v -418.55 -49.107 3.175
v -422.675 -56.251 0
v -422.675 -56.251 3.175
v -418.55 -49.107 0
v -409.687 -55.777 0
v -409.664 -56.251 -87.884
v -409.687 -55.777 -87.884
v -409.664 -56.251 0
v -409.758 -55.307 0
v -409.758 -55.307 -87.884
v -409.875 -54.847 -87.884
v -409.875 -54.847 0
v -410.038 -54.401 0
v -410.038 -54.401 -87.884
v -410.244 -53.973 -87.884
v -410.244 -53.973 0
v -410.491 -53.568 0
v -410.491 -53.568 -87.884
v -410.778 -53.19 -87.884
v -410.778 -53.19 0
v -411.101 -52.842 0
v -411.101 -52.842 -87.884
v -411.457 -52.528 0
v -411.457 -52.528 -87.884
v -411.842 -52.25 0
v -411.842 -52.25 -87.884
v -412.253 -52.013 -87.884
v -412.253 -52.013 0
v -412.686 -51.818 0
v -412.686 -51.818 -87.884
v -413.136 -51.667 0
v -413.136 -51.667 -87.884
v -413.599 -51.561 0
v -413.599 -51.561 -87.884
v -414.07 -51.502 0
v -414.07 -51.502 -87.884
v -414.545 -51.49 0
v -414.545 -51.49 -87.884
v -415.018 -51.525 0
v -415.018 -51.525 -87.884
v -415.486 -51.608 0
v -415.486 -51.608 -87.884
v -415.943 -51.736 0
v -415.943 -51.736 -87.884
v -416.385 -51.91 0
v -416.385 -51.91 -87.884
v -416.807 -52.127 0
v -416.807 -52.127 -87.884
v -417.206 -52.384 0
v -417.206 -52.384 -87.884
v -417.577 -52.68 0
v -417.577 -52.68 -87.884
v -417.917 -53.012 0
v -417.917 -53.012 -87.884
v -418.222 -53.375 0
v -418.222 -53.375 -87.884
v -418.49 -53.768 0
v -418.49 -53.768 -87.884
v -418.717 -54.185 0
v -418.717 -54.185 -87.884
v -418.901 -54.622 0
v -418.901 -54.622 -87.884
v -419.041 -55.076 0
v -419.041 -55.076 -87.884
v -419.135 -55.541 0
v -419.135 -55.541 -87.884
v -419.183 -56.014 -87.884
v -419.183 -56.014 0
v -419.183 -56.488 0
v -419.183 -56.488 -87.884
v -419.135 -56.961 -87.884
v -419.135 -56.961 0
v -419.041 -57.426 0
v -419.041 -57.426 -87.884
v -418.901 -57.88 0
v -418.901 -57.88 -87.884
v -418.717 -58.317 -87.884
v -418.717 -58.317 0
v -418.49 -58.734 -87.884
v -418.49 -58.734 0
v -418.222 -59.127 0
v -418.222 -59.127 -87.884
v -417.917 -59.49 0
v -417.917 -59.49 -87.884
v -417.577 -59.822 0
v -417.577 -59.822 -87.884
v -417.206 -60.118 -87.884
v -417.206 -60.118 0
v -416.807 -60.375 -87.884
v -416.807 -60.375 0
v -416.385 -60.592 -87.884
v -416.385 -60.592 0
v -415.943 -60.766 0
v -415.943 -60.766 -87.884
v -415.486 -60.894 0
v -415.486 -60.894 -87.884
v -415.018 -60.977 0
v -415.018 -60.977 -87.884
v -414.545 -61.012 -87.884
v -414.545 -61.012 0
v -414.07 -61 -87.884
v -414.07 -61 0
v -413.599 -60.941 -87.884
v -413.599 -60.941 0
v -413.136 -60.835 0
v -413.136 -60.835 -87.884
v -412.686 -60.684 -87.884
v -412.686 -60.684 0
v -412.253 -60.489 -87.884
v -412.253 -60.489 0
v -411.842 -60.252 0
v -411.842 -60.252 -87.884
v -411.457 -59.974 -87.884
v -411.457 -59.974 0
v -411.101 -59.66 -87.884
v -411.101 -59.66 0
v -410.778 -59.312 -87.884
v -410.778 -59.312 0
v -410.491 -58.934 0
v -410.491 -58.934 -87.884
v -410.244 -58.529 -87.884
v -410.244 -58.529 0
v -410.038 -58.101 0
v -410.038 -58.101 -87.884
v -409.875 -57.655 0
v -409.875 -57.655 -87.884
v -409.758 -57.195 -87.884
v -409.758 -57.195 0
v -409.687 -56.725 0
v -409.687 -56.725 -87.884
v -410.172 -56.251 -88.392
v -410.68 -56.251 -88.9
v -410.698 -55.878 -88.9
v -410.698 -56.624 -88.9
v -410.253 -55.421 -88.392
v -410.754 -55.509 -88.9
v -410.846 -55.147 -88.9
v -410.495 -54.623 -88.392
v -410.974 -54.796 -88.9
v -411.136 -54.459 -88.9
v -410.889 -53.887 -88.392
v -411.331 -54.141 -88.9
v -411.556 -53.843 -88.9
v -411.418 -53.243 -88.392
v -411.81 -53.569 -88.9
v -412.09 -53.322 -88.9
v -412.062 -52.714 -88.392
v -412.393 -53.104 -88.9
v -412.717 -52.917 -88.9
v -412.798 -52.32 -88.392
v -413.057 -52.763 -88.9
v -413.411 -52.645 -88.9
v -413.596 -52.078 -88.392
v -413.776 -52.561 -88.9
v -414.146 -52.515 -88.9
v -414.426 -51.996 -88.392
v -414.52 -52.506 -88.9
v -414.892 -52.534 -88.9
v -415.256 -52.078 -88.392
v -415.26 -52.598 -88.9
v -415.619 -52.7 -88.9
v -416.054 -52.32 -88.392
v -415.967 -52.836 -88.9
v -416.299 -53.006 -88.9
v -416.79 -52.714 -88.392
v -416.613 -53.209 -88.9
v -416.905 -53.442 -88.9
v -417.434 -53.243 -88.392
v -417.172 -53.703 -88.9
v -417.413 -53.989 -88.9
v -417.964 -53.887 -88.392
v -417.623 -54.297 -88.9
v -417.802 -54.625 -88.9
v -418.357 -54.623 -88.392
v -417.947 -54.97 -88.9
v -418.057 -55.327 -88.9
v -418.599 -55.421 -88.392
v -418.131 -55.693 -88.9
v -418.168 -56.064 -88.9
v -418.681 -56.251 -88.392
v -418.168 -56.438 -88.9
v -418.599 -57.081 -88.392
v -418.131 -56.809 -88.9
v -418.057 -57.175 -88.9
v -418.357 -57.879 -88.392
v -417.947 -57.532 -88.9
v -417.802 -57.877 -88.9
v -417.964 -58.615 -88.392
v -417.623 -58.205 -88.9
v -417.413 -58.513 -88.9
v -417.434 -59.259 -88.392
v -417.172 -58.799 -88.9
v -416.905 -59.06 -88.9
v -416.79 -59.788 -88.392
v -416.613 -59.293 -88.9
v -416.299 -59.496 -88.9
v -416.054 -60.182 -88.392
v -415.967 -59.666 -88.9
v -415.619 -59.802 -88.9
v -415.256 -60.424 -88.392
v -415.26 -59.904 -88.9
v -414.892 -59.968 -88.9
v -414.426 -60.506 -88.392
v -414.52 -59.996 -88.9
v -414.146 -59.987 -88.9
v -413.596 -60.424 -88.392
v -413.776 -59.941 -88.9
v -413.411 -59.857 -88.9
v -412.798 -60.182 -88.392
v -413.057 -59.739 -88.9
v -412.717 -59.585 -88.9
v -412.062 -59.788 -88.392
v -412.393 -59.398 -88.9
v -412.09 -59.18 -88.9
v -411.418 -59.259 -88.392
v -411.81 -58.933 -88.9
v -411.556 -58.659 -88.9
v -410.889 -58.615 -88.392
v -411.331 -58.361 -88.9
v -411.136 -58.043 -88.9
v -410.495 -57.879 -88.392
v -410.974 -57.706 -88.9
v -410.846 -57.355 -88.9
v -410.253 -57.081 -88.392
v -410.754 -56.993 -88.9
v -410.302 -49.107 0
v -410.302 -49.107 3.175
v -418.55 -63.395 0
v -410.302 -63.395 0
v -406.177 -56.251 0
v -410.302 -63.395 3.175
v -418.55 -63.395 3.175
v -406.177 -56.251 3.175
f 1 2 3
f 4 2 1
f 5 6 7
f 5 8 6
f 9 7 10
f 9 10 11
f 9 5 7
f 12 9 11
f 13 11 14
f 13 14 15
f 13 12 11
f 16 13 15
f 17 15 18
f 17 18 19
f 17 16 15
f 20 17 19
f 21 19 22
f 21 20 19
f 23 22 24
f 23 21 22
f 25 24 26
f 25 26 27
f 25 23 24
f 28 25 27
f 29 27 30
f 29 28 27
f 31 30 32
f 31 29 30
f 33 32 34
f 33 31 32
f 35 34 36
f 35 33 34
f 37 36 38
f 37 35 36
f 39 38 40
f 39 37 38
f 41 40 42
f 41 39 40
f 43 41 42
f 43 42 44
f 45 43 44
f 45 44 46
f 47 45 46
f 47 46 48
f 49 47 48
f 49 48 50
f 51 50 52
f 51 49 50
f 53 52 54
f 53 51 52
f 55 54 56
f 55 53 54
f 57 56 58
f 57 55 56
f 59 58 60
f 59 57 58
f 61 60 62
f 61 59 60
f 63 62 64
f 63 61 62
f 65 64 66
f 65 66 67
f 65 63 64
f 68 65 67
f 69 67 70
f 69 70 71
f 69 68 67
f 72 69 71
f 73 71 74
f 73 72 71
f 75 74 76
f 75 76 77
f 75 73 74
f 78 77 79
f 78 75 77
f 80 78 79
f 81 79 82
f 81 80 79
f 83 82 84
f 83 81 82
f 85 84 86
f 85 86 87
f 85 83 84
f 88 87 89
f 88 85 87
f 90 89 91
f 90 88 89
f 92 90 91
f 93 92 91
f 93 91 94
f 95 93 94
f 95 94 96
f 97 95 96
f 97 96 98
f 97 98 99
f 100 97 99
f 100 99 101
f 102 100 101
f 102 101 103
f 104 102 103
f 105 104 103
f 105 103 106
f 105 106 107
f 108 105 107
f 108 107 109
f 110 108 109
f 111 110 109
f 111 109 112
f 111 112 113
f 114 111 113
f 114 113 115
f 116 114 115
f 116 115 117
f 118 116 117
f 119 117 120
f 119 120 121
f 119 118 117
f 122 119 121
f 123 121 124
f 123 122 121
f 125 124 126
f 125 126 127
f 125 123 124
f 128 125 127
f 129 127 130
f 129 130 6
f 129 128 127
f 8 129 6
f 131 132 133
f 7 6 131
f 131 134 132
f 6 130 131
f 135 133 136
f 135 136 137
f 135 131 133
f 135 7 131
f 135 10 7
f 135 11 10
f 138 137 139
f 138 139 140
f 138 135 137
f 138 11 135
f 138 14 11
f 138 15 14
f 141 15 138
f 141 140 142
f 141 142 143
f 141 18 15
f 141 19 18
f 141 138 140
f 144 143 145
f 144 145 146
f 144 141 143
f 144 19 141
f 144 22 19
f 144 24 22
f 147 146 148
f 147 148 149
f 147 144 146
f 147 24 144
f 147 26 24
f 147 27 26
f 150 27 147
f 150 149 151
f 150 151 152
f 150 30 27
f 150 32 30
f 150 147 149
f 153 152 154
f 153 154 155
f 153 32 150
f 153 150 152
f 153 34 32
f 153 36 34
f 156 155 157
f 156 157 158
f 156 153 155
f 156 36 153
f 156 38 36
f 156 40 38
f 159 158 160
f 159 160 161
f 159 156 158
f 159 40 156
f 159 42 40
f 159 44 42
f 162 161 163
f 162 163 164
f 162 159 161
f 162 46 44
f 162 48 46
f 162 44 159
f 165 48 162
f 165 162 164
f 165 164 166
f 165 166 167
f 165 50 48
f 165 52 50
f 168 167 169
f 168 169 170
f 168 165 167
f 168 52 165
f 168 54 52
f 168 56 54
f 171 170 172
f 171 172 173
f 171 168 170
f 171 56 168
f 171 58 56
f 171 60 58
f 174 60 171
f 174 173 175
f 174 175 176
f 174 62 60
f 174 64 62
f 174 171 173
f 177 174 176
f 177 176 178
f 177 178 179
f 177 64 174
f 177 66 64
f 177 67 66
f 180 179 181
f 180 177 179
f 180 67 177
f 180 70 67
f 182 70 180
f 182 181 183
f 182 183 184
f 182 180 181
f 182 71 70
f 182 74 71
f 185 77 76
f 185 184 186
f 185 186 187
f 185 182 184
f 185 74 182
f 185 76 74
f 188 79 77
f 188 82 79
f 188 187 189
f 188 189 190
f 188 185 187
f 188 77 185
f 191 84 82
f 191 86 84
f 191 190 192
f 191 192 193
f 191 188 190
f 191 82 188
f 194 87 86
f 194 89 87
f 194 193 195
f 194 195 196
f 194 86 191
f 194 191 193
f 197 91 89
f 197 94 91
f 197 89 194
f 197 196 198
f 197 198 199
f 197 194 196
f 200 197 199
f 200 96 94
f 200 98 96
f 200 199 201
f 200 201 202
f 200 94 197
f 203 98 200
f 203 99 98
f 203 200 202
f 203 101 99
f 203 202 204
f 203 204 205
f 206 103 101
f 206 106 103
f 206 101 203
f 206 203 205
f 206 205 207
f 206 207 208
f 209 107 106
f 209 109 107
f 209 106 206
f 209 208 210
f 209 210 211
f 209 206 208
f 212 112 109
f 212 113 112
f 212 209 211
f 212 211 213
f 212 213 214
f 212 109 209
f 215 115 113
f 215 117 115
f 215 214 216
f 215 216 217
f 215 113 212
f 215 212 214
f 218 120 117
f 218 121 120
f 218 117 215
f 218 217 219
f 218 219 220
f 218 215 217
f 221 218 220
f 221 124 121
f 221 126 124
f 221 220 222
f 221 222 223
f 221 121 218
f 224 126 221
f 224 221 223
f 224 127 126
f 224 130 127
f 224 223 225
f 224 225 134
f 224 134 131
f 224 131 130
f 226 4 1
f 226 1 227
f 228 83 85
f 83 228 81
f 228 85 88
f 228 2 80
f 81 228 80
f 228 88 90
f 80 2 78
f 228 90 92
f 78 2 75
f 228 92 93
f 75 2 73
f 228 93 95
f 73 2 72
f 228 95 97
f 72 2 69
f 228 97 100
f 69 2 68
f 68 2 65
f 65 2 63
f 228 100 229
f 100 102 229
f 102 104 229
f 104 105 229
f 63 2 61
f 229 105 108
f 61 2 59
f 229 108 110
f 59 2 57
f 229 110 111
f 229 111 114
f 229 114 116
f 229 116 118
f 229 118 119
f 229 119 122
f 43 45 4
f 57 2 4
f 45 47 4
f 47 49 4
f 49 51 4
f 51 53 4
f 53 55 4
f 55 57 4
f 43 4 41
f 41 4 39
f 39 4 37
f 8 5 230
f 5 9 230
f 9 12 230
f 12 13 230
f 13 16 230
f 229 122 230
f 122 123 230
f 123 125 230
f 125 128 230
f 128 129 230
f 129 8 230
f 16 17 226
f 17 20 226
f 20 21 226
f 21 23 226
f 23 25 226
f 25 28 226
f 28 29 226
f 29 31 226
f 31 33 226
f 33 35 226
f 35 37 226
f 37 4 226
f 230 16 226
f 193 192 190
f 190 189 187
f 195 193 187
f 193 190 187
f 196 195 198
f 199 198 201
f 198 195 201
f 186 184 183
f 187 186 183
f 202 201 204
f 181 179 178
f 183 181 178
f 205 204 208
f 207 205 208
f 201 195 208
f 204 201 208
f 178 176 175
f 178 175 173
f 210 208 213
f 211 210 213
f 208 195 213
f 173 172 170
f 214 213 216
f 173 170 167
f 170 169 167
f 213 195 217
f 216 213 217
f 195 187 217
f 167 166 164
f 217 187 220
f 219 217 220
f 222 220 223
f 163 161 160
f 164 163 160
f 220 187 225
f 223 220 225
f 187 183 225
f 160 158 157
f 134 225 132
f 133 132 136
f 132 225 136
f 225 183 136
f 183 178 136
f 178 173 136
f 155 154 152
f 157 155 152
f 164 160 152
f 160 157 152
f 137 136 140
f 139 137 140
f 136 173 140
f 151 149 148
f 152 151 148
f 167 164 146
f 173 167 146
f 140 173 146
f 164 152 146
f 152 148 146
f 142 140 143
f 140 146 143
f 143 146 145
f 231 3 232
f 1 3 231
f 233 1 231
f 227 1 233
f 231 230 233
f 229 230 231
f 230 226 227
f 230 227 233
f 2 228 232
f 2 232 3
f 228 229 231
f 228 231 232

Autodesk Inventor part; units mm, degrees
ref_plane "YZ Plane" through (0, 0, 0) normal (1, 0, 0) x (0, 1, 0)
ref_plane "XZ Plane" through (0, 0, 0) normal (0, 1, 0) x (-1, 0, 0)
ref_plane "XY Plane" through (0, 0, 0) normal (0, 0, 1) x (1, 0, 0)
sketch "Sketch1" plane through (0, 0, 0) normal (0, 0, 1) x (1, 0, 0)
  circle A0 centre (-414.4261, -56.251) radius 4.7625
  point P0 (0, 0)
  dimension "d0" = 9.525
extrude "Extrusion1" add sketch "Sketch1" against normal blind 88.9
sketch "Sketch2" plane through (-414.4261, -56.251, 0) normal (0, 0, 1) x (1, 0, 0)
  circle A0 centre (0, 0) radius 4.7625 projected
  line L0 (-8.2489, 0) -> (-4.1244, 7.1437)
  line L1 (-4.1244, 7.1437) -> (4.1244, 7.1438)
  line L2 (4.1244, 7.1438) -> (8.2489, 0)
  line L3 (8.2489, 0) -> (4.1244, -7.1437)
  line L4 (4.1244, -7.1437) -> (-4.1244, -7.1438)
  line L5 (-4.1244, -7.1438) -> (-8.2489, 0)
  point P0 (414.4261, 56.251)
  dimension "d3" = 14.2875
extrude "Extrusion2" add sketch "Sketch2" along normal blind 3.175 contours A0 | L0 L1 L2 L3 L4 L5
thread "Thread1" size "3/8-16 UNC" class "2A" standard "ANSI Unified Screw Threads" length 25.4
chamfer "Chamfer1" distance 1.016 angle 45 1 edges at (-419.1886, -56.251, -88.9)
properties part number "375 bolt x4" material "Steel"
